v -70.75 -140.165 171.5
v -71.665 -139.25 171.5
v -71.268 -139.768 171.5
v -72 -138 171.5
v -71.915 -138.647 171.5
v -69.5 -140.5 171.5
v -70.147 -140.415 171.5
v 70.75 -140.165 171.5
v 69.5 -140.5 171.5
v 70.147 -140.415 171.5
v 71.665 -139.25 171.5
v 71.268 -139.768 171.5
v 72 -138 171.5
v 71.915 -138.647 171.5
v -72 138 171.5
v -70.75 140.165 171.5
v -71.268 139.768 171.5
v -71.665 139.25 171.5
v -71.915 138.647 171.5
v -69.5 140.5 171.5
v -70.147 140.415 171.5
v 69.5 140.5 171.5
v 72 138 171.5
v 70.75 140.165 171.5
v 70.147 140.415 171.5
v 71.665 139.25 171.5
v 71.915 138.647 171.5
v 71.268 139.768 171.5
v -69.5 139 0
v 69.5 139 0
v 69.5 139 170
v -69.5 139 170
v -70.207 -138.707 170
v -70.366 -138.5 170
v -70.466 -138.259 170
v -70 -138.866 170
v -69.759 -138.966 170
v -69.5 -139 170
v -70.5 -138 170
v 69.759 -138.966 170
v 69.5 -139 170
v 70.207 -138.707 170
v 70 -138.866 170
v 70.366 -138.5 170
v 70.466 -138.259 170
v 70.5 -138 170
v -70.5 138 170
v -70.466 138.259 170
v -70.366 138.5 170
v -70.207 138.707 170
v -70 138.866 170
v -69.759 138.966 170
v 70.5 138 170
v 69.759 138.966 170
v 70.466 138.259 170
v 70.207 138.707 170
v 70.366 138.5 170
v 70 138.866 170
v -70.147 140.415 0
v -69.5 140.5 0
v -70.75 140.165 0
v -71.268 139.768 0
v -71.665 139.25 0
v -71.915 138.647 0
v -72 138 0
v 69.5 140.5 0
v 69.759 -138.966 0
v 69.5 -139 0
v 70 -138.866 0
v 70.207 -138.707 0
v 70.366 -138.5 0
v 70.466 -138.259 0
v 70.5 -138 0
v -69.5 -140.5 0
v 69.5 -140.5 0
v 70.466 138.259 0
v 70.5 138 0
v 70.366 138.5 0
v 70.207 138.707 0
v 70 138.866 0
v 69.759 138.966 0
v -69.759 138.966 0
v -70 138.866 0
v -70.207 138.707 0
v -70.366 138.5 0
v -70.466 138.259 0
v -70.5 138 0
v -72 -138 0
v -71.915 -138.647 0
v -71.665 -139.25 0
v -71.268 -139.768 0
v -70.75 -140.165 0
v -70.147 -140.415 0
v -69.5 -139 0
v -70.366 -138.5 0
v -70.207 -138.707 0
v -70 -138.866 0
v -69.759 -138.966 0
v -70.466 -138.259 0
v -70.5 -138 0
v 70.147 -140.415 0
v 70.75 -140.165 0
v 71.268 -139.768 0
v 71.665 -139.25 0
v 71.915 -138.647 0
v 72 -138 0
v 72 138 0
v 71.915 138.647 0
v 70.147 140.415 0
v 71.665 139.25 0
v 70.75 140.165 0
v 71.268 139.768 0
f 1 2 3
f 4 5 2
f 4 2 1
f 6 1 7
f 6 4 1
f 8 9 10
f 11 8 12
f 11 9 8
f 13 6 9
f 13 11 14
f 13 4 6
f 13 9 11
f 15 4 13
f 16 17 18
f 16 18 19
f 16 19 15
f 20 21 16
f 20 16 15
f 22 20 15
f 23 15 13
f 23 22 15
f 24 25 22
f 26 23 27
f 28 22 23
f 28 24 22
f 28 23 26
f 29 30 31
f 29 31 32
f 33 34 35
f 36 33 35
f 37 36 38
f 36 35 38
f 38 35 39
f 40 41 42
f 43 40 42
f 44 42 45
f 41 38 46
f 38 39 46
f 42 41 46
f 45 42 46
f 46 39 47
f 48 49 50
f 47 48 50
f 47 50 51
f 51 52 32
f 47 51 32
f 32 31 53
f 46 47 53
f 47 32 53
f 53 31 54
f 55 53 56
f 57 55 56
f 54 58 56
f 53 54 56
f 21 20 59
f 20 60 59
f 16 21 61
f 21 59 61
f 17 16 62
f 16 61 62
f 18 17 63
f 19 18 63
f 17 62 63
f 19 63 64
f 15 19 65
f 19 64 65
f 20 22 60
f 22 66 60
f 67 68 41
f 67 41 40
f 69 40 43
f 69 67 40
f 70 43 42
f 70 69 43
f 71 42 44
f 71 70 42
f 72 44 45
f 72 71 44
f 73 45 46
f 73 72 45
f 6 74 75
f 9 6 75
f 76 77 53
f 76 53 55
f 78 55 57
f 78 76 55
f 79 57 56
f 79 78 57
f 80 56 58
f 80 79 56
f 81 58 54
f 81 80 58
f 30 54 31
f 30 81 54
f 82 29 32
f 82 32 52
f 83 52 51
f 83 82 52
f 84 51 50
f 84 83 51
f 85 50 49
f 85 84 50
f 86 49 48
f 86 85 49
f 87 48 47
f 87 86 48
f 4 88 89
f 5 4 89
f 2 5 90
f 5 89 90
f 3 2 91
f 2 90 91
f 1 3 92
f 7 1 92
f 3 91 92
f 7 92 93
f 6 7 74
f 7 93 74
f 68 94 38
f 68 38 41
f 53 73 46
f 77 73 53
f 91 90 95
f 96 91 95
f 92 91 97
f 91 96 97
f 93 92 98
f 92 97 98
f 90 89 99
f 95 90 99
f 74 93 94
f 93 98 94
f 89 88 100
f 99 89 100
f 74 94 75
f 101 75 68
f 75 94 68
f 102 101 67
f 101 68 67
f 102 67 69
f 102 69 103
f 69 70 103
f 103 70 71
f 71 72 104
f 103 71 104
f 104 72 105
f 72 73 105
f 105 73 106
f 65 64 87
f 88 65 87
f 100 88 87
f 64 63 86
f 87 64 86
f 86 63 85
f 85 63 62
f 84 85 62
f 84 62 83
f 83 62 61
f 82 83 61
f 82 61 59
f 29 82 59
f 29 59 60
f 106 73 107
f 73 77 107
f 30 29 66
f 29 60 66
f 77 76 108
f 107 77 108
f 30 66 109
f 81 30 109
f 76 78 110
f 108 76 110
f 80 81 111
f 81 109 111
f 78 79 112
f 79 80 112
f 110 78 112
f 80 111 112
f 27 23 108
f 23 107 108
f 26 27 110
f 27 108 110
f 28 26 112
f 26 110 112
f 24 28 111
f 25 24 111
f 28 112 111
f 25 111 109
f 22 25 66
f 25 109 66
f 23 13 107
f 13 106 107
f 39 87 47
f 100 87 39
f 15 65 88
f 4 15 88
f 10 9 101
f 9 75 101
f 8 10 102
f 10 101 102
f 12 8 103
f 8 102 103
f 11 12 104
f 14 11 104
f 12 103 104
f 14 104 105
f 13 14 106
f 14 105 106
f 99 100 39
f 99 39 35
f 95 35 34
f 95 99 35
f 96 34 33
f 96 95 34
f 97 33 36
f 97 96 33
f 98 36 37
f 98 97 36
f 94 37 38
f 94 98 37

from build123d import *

# Parameters (mm, degrees)
BOSS_EXTRUDE1_DEPTH = 170
BOSS_EXTRUDE2_DEPTH = 1.5


with BuildPart() as part:
    # Sketch1 → Boss-Extrude1 (new body)
    with BuildSketch(Plane.XY):
        with BuildLine():
            Line((69.5, 140.5), (-69.5, 140.5))
            ThreePointArc((-69.5, 140.5), (-71.267766953, 139.767766953), (-72, 138))
            Line((-72, 138), (-72, -138))
            ThreePointArc((-72, -138), (-71.267766953, -139.767766953), (-69.5, -140.5))
            Line((-69.5, -140.5), (69.5, -140.5))
            ThreePointArc((69.5, -140.5), (71.267766953, -139.767766953), (72, -138))
            Line((72, -138), (72, 138))
            ThreePointArc((72, 138), (71.267766953, 139.767766953), (69.5, 140.5))
        make_face()
        with BuildLine():
            Line((-69.5, -139), (69.5, -139))
            ThreePointArc((69.5, -139), (70.207106781, -138.707106781), (70.5, -138))
            Line((70.5, -138), (70.5, 138))
            ThreePointArc((70.5, 138), (70.207106781, 138.707106781), (69.5, 139))
            Line((69.5, 139), (-69.5, 139))
            ThreePointArc((-69.5, 139), (-70.207106781, 138.707106781), (-70.5, 138))
            Line((-70.5, 138), (-70.5, -138))
            ThreePointArc((-70.5, -138), (-70.207106781, -138.707106781), (-69.5, -139))
        make_face(mode=Mode.SUBTRACT)
    extrude(amount=BOSS_EXTRUDE1_DEPTH)

    # Sketch2 → Boss-Extrude2 (add)
    with BuildSketch(Plane.XY.offset(170)):
        with BuildLine():
            Line((-69.5, -140.5), (69.5, -140.5))
            ThreePointArc((69.5, -140.5), (71.267766953, -139.767766953), (72, -138))
            Line((72, -138), (72, 138))
            ThreePointArc((72, 138), (71.267766953, 139.767766953), (69.5, 140.5))
            Line((69.5, 140.5), (-69.5, 140.5))
            ThreePointArc((-69.5, 140.5), (-71.267766953, 139.767766953), (-72, 138))
            Line((-72, 138), (-72, -138))
            ThreePointArc((-72, -138), (-71.267766953, -139.767766953), (-69.5, -140.5))
        make_face()
    extrude(amount=BOSS_EXTRUDE2_DEPTH)


solid = part.part
